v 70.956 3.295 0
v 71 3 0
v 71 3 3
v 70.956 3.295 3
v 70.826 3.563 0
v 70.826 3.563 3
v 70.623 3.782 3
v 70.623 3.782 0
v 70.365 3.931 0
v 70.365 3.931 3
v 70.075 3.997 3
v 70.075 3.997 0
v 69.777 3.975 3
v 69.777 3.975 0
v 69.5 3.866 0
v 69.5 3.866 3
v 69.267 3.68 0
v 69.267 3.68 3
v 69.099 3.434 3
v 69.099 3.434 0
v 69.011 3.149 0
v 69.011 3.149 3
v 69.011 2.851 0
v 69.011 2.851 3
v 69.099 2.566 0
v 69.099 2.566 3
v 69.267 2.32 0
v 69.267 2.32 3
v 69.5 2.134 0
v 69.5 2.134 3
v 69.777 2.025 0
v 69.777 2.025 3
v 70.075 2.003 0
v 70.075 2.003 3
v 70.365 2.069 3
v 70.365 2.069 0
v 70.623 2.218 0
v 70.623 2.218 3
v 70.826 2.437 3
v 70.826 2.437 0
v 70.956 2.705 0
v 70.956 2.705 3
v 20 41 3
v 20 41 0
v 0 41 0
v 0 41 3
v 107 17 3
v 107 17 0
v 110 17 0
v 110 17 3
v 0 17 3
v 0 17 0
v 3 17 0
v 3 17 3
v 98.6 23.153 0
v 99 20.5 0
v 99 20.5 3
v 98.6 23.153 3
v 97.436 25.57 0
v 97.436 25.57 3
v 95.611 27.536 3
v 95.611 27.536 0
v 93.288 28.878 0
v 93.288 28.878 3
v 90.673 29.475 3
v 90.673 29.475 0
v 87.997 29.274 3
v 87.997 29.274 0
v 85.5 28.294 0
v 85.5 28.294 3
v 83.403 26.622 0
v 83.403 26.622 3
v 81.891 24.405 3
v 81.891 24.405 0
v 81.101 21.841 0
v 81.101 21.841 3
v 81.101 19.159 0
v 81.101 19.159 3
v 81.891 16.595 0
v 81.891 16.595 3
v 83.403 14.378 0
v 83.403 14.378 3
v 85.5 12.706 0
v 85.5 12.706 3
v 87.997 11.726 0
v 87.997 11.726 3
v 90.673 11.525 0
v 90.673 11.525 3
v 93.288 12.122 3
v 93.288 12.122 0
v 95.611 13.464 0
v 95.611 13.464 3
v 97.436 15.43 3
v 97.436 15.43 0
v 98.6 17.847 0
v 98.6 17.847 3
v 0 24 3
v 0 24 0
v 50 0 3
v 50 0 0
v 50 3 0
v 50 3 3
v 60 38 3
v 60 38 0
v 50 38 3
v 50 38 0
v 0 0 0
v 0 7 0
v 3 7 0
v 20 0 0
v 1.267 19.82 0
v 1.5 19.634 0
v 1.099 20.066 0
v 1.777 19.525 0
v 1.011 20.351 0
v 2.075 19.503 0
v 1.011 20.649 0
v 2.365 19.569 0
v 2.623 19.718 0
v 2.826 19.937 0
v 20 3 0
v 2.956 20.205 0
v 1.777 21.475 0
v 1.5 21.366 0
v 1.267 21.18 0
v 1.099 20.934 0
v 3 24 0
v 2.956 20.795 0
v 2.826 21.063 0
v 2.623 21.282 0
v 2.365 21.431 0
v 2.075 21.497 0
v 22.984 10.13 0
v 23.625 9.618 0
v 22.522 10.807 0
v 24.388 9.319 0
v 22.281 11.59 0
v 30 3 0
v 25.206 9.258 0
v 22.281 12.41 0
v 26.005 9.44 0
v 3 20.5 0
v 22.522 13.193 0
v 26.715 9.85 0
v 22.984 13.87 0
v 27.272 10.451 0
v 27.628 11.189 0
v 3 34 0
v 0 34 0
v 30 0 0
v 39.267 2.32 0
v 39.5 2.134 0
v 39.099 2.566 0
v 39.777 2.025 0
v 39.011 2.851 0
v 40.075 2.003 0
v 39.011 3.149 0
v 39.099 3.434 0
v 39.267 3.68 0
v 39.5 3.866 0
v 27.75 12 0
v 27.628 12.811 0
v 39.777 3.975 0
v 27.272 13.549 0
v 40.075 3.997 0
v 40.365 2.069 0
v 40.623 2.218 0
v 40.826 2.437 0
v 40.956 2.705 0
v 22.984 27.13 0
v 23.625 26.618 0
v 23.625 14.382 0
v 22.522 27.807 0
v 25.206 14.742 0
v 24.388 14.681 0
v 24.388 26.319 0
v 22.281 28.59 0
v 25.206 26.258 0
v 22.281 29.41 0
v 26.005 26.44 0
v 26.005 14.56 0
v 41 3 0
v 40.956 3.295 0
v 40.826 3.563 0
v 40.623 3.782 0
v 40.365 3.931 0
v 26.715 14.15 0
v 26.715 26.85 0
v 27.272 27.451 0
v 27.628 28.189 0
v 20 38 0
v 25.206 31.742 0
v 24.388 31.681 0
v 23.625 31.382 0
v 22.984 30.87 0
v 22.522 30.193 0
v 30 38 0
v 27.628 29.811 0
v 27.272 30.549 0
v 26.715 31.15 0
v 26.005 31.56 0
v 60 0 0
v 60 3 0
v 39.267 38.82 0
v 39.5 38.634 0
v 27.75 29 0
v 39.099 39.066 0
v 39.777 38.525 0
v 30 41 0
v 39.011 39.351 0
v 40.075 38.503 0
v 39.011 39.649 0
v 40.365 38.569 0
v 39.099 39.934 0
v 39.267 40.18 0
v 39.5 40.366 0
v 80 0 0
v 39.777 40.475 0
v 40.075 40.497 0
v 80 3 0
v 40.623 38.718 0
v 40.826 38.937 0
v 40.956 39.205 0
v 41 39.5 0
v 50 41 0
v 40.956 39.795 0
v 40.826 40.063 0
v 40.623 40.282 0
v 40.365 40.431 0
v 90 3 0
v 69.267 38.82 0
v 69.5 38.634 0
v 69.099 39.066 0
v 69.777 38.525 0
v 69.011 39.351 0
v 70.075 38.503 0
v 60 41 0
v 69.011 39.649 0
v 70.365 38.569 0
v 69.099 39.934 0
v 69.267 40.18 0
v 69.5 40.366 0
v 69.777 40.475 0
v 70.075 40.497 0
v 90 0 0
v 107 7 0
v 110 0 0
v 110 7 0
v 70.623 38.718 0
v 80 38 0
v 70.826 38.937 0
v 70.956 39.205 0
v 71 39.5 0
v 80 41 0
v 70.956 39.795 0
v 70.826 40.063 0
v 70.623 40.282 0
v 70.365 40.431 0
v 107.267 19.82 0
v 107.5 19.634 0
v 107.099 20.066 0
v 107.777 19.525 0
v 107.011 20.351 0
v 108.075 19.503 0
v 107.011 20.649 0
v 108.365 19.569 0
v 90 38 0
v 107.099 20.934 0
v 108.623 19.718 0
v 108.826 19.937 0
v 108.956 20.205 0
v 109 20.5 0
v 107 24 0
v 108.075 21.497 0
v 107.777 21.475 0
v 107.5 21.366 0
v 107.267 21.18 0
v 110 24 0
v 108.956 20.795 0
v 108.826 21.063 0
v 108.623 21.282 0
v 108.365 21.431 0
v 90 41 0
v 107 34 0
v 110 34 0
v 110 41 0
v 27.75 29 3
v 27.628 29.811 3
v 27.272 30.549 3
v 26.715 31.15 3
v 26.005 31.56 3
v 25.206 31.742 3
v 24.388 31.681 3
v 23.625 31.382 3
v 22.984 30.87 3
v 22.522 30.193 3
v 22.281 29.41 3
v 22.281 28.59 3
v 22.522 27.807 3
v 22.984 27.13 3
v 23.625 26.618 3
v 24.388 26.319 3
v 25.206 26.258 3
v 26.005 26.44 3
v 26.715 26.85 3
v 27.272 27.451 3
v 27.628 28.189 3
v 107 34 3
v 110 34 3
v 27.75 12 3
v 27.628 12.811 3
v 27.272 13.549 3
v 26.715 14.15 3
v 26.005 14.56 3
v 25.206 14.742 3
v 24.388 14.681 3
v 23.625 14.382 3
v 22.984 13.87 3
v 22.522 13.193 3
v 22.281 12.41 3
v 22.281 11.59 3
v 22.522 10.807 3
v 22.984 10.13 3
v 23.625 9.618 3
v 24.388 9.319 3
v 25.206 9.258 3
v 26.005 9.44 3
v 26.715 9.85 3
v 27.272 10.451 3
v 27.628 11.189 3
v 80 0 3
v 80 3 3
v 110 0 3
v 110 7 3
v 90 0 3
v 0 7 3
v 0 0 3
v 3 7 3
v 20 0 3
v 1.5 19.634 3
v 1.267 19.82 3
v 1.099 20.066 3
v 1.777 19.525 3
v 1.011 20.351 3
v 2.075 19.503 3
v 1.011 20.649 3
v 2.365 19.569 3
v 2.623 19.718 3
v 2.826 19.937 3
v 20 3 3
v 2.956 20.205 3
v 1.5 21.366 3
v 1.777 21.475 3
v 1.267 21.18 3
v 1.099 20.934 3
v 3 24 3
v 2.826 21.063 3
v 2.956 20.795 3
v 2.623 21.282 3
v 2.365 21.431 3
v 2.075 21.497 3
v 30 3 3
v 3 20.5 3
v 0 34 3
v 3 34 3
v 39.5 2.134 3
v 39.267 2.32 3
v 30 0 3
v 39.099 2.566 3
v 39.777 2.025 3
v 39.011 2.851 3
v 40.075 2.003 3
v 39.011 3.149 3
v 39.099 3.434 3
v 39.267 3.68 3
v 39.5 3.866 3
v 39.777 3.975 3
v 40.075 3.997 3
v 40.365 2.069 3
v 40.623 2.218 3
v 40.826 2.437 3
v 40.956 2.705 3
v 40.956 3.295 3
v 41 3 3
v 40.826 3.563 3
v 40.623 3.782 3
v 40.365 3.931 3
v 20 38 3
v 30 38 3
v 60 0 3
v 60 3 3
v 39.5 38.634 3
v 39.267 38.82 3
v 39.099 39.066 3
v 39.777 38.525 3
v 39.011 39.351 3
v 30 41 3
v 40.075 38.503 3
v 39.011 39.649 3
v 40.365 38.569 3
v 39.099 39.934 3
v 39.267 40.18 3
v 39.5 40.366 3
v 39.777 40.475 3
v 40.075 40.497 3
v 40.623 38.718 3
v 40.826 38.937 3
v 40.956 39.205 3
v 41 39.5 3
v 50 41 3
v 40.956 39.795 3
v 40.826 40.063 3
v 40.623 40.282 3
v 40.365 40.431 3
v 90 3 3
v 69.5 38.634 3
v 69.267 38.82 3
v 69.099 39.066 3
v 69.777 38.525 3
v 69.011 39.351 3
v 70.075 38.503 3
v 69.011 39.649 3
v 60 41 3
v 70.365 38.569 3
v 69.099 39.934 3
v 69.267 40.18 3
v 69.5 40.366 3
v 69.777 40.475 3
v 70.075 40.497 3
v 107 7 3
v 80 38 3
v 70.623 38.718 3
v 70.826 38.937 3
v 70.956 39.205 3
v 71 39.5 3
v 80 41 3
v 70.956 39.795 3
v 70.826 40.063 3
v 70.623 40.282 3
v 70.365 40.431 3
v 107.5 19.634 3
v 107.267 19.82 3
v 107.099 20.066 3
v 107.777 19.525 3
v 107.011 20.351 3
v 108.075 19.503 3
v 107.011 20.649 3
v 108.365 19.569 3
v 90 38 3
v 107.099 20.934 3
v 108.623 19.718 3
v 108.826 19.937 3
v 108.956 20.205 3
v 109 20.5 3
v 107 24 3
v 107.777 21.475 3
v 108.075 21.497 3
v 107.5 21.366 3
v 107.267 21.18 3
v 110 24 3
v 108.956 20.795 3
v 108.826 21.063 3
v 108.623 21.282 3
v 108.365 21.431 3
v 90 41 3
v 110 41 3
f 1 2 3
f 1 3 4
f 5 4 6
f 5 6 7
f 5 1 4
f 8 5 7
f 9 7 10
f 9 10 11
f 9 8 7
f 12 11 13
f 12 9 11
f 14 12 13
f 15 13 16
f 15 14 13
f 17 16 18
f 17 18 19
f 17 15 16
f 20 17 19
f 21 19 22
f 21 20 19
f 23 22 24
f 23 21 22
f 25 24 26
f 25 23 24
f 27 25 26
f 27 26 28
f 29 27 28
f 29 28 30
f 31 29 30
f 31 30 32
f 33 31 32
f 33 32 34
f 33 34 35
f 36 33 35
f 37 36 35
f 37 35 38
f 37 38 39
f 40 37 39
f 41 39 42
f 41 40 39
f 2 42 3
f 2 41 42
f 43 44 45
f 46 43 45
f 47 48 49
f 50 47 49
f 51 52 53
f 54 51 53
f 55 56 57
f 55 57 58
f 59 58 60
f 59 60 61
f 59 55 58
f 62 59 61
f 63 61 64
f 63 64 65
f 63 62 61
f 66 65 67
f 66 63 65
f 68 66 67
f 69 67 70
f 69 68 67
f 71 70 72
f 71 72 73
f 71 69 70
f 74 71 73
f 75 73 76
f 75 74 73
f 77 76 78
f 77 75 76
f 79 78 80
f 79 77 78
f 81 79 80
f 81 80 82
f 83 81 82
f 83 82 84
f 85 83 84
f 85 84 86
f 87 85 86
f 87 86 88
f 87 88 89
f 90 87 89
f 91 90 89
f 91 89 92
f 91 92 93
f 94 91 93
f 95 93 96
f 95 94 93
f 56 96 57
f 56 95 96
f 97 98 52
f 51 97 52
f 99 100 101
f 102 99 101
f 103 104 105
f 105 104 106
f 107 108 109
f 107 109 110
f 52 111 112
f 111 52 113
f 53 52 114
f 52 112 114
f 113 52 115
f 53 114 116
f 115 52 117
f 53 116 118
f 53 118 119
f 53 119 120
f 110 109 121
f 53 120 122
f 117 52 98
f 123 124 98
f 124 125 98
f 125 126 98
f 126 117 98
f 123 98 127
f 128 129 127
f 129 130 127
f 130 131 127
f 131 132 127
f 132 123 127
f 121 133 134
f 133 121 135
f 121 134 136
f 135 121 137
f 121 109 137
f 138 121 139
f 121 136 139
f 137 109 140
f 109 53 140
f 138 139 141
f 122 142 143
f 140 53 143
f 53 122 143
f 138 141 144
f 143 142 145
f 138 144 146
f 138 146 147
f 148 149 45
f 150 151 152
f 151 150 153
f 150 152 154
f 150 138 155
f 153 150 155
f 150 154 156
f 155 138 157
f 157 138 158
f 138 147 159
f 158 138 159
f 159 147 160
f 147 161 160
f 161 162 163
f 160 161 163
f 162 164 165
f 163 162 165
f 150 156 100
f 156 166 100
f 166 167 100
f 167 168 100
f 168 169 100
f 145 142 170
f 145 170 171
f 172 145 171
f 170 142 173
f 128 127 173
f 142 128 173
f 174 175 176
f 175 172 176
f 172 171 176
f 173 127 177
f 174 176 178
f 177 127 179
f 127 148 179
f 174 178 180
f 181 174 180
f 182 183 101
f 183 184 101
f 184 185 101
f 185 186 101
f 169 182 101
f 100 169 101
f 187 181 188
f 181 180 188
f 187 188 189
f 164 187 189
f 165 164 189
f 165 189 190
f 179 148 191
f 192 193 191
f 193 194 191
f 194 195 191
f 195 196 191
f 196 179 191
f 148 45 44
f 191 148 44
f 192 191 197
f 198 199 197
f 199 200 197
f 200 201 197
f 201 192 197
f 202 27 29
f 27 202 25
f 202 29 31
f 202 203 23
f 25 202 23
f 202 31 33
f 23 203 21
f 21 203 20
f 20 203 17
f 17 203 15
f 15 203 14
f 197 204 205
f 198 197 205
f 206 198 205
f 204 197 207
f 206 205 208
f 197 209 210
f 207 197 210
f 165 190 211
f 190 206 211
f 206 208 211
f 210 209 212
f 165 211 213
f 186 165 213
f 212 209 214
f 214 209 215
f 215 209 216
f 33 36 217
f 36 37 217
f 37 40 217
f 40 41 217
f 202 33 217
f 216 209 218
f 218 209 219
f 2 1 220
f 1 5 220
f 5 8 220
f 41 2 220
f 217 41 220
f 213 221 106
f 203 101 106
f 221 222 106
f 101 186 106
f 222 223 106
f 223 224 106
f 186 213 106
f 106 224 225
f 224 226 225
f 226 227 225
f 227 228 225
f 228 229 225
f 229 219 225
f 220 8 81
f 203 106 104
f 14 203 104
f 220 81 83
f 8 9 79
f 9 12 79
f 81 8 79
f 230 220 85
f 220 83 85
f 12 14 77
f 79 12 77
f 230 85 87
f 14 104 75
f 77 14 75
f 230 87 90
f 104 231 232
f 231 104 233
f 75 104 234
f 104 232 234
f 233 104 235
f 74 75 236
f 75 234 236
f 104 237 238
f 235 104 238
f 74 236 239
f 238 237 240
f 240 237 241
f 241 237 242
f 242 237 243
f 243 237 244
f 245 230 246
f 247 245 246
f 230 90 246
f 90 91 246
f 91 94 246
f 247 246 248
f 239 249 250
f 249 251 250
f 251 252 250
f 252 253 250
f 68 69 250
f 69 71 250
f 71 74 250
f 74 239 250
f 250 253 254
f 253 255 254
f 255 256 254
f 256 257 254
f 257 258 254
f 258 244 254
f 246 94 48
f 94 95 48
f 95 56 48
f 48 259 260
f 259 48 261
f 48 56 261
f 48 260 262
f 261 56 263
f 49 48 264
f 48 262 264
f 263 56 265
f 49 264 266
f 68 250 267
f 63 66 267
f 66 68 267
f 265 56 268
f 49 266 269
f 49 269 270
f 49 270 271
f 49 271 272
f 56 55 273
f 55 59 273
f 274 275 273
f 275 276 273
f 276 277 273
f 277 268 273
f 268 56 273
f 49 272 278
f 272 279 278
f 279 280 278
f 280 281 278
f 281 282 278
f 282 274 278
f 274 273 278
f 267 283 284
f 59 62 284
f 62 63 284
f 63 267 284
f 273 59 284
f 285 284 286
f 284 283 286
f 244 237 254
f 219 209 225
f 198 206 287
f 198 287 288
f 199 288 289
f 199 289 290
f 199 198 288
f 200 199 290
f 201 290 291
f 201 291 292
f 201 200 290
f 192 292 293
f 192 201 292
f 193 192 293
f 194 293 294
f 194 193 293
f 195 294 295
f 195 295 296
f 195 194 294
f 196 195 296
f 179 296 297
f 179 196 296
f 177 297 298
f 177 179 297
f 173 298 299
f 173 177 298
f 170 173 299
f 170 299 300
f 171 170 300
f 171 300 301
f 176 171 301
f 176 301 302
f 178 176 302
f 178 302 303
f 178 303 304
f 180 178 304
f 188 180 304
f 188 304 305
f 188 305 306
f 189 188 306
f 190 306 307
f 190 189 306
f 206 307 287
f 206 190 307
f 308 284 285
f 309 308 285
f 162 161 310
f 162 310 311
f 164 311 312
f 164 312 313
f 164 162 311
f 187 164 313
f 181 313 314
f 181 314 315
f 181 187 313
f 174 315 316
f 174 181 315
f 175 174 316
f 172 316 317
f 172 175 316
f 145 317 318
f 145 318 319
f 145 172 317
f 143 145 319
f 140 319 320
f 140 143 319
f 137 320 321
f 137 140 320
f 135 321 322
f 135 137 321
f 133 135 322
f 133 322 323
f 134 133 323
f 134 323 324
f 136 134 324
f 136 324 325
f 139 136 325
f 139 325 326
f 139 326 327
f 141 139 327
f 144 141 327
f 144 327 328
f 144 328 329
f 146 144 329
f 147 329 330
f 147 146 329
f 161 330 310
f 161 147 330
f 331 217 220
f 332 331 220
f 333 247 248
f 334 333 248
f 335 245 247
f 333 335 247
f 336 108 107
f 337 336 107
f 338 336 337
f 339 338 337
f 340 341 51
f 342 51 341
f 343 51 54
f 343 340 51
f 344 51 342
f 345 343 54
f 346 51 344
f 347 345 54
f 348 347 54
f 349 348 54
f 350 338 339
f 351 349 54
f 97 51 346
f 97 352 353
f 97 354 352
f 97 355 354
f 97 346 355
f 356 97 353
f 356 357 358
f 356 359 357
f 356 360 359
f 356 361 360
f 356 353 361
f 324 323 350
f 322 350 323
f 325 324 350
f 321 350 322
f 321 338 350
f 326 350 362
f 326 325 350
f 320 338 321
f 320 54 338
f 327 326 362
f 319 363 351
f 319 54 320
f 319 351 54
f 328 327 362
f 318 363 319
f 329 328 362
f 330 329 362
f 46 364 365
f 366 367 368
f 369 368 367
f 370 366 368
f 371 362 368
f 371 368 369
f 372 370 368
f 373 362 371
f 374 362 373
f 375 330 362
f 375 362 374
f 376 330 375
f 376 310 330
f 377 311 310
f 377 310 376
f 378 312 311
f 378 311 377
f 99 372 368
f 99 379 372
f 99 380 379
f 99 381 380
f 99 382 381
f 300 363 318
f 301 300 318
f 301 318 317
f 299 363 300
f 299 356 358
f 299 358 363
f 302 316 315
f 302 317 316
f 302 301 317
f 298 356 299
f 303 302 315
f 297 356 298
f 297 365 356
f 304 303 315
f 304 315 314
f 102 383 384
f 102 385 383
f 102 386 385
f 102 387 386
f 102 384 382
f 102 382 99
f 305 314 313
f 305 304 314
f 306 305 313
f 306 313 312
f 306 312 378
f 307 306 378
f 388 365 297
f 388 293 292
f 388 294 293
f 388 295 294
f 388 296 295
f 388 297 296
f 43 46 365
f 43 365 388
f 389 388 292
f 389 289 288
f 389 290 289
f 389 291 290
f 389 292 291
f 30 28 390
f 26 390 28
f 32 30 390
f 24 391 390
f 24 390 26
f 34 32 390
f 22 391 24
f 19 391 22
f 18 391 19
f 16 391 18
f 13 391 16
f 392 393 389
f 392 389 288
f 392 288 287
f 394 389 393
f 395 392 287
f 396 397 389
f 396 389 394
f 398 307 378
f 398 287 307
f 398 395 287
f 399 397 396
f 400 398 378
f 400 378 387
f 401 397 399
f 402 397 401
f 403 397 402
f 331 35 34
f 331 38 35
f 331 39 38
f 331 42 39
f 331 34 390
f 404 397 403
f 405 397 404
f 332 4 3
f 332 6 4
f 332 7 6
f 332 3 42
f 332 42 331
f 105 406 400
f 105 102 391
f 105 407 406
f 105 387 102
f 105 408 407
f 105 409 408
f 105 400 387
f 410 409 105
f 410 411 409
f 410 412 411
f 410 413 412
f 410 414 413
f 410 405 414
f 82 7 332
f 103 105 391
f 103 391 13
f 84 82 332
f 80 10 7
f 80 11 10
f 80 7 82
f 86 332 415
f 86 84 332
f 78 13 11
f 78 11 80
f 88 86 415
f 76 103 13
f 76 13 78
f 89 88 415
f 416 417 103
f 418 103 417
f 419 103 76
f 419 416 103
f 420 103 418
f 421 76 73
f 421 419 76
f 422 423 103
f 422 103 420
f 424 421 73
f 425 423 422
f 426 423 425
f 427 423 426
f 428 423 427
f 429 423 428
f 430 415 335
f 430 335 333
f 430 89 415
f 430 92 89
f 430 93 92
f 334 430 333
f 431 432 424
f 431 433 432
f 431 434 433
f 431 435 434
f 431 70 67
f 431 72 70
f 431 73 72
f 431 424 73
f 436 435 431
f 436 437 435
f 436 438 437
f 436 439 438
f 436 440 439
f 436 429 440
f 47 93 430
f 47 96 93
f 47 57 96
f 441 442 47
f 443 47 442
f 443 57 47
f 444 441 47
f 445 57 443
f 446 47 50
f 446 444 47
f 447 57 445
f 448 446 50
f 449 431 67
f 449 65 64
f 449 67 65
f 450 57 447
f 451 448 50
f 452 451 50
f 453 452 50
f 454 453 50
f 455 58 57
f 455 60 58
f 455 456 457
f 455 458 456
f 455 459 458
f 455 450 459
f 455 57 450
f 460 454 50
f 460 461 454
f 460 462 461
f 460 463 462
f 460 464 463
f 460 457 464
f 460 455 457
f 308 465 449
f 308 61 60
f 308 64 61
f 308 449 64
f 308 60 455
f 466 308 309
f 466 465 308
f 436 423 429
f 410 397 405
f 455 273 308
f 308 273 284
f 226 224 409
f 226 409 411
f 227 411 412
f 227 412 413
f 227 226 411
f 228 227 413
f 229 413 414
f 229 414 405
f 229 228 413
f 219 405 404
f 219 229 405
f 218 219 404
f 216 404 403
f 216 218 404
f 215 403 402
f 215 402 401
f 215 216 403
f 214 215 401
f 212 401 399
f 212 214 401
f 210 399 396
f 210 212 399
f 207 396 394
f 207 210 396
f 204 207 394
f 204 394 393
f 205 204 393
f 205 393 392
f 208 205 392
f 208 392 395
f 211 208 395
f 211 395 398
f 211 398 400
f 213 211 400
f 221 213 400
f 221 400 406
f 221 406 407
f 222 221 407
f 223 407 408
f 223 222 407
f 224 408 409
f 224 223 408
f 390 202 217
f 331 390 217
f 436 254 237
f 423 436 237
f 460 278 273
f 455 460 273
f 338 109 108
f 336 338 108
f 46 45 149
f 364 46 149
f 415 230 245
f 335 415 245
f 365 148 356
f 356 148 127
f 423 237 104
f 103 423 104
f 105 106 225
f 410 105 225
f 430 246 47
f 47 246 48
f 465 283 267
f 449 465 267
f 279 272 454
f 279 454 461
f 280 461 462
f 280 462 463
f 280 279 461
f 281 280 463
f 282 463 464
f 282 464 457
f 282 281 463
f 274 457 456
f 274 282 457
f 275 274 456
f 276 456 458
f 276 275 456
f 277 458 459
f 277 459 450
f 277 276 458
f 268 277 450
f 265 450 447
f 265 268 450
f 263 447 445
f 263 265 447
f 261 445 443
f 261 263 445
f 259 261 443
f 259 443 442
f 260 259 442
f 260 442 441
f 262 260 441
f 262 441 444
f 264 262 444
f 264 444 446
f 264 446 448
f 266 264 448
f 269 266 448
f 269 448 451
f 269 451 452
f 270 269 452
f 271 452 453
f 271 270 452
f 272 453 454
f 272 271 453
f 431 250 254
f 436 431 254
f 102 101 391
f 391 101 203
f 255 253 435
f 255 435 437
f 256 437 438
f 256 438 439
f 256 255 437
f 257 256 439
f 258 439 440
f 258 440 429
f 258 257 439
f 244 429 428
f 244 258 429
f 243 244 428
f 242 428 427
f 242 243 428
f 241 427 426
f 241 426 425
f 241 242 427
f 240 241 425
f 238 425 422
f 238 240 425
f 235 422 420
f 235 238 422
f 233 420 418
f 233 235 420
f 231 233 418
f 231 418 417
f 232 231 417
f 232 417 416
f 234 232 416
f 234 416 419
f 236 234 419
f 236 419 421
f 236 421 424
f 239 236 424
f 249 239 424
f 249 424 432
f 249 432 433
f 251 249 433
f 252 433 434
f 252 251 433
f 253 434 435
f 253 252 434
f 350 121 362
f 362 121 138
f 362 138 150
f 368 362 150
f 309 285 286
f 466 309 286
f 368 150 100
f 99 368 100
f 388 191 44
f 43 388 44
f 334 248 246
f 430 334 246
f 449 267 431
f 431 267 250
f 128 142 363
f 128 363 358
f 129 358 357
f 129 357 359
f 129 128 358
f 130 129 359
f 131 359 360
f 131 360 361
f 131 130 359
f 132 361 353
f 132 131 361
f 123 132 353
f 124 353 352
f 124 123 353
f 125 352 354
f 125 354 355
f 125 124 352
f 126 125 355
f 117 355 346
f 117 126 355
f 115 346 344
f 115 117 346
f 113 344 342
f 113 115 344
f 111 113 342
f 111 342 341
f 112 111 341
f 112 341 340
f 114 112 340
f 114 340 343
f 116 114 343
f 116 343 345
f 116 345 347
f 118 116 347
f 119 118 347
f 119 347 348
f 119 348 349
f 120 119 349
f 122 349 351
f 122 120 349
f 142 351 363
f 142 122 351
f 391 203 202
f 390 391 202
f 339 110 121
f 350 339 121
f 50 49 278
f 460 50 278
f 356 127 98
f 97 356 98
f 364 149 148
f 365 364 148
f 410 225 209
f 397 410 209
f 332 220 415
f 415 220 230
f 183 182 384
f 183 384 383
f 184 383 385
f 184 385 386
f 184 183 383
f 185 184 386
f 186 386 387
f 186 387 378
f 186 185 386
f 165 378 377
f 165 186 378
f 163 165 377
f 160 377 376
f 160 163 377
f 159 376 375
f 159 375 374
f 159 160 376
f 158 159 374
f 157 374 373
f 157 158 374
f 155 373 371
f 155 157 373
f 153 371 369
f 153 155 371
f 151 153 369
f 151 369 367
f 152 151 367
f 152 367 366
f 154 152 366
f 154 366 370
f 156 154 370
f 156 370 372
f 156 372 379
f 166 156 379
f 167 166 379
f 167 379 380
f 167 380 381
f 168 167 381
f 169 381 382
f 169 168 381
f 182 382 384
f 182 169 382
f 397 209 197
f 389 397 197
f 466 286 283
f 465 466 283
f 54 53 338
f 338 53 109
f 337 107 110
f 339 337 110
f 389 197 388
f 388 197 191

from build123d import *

# Parameters (mm, degrees)
F0_R     = 1
F0_R_2   = 2.75
F0_R_3   = 9
F1_DEPTH = 3


with BuildPart() as f1:
    # F0 (on Top) → F1 (new body)
    with BuildSketch(Plane.XY):
        Polygon((0, 7), (0, 0), (20, 0), (20, 3), (30, 3), (30, 0), (50, 0), (50, 3), (55, 3), (60, 3), (60, 0), (80, 0), (80, 3), (90, 3), (90, 0), (110, 0), (110, 7), (107, 7), (107, 17), (110, 17), (110, 24), (107, 24), (107, 34), (110, 34), (110, 41), (90, 41), (90, 38), (80, 38), (80, 41), (60, 41), (60, 38), (55, 38), (50, 38), (50, 41), (30, 41), (30, 38), (20, 38), (20, 41), (0, 41), (0, 34), (3, 34), (3, 24), (0, 24), (0, 17), (3, 17), (3, 7), align=None)
        with Locations((40, 3)):
            Circle(F0_R, mode=Mode.SUBTRACT)
        with Locations((25, 12)):
            Circle(F0_R_2, mode=Mode.SUBTRACT)
        with Locations((70, 3)):
            Circle(F0_R, mode=Mode.SUBTRACT)
        with Locations((2, 20.5)):
            Circle(F0_R, mode=Mode.SUBTRACT)
        with Locations((25, 29)):
            Circle(F0_R_2, mode=Mode.SUBTRACT)
        with Locations((40, 39.5)):
            Circle(F0_R, mode=Mode.SUBTRACT)
        with Locations((90, 20.5)):
            Circle(F0_R_3, mode=Mode.SUBTRACT)
        with Locations((108, 20.5)):
            Circle(F0_R, mode=Mode.SUBTRACT)
        with Locations((70, 39.5)):
            Circle(F0_R, mode=Mode.SUBTRACT)
    extrude(amount=F1_DEPTH)


solid = f1.part
